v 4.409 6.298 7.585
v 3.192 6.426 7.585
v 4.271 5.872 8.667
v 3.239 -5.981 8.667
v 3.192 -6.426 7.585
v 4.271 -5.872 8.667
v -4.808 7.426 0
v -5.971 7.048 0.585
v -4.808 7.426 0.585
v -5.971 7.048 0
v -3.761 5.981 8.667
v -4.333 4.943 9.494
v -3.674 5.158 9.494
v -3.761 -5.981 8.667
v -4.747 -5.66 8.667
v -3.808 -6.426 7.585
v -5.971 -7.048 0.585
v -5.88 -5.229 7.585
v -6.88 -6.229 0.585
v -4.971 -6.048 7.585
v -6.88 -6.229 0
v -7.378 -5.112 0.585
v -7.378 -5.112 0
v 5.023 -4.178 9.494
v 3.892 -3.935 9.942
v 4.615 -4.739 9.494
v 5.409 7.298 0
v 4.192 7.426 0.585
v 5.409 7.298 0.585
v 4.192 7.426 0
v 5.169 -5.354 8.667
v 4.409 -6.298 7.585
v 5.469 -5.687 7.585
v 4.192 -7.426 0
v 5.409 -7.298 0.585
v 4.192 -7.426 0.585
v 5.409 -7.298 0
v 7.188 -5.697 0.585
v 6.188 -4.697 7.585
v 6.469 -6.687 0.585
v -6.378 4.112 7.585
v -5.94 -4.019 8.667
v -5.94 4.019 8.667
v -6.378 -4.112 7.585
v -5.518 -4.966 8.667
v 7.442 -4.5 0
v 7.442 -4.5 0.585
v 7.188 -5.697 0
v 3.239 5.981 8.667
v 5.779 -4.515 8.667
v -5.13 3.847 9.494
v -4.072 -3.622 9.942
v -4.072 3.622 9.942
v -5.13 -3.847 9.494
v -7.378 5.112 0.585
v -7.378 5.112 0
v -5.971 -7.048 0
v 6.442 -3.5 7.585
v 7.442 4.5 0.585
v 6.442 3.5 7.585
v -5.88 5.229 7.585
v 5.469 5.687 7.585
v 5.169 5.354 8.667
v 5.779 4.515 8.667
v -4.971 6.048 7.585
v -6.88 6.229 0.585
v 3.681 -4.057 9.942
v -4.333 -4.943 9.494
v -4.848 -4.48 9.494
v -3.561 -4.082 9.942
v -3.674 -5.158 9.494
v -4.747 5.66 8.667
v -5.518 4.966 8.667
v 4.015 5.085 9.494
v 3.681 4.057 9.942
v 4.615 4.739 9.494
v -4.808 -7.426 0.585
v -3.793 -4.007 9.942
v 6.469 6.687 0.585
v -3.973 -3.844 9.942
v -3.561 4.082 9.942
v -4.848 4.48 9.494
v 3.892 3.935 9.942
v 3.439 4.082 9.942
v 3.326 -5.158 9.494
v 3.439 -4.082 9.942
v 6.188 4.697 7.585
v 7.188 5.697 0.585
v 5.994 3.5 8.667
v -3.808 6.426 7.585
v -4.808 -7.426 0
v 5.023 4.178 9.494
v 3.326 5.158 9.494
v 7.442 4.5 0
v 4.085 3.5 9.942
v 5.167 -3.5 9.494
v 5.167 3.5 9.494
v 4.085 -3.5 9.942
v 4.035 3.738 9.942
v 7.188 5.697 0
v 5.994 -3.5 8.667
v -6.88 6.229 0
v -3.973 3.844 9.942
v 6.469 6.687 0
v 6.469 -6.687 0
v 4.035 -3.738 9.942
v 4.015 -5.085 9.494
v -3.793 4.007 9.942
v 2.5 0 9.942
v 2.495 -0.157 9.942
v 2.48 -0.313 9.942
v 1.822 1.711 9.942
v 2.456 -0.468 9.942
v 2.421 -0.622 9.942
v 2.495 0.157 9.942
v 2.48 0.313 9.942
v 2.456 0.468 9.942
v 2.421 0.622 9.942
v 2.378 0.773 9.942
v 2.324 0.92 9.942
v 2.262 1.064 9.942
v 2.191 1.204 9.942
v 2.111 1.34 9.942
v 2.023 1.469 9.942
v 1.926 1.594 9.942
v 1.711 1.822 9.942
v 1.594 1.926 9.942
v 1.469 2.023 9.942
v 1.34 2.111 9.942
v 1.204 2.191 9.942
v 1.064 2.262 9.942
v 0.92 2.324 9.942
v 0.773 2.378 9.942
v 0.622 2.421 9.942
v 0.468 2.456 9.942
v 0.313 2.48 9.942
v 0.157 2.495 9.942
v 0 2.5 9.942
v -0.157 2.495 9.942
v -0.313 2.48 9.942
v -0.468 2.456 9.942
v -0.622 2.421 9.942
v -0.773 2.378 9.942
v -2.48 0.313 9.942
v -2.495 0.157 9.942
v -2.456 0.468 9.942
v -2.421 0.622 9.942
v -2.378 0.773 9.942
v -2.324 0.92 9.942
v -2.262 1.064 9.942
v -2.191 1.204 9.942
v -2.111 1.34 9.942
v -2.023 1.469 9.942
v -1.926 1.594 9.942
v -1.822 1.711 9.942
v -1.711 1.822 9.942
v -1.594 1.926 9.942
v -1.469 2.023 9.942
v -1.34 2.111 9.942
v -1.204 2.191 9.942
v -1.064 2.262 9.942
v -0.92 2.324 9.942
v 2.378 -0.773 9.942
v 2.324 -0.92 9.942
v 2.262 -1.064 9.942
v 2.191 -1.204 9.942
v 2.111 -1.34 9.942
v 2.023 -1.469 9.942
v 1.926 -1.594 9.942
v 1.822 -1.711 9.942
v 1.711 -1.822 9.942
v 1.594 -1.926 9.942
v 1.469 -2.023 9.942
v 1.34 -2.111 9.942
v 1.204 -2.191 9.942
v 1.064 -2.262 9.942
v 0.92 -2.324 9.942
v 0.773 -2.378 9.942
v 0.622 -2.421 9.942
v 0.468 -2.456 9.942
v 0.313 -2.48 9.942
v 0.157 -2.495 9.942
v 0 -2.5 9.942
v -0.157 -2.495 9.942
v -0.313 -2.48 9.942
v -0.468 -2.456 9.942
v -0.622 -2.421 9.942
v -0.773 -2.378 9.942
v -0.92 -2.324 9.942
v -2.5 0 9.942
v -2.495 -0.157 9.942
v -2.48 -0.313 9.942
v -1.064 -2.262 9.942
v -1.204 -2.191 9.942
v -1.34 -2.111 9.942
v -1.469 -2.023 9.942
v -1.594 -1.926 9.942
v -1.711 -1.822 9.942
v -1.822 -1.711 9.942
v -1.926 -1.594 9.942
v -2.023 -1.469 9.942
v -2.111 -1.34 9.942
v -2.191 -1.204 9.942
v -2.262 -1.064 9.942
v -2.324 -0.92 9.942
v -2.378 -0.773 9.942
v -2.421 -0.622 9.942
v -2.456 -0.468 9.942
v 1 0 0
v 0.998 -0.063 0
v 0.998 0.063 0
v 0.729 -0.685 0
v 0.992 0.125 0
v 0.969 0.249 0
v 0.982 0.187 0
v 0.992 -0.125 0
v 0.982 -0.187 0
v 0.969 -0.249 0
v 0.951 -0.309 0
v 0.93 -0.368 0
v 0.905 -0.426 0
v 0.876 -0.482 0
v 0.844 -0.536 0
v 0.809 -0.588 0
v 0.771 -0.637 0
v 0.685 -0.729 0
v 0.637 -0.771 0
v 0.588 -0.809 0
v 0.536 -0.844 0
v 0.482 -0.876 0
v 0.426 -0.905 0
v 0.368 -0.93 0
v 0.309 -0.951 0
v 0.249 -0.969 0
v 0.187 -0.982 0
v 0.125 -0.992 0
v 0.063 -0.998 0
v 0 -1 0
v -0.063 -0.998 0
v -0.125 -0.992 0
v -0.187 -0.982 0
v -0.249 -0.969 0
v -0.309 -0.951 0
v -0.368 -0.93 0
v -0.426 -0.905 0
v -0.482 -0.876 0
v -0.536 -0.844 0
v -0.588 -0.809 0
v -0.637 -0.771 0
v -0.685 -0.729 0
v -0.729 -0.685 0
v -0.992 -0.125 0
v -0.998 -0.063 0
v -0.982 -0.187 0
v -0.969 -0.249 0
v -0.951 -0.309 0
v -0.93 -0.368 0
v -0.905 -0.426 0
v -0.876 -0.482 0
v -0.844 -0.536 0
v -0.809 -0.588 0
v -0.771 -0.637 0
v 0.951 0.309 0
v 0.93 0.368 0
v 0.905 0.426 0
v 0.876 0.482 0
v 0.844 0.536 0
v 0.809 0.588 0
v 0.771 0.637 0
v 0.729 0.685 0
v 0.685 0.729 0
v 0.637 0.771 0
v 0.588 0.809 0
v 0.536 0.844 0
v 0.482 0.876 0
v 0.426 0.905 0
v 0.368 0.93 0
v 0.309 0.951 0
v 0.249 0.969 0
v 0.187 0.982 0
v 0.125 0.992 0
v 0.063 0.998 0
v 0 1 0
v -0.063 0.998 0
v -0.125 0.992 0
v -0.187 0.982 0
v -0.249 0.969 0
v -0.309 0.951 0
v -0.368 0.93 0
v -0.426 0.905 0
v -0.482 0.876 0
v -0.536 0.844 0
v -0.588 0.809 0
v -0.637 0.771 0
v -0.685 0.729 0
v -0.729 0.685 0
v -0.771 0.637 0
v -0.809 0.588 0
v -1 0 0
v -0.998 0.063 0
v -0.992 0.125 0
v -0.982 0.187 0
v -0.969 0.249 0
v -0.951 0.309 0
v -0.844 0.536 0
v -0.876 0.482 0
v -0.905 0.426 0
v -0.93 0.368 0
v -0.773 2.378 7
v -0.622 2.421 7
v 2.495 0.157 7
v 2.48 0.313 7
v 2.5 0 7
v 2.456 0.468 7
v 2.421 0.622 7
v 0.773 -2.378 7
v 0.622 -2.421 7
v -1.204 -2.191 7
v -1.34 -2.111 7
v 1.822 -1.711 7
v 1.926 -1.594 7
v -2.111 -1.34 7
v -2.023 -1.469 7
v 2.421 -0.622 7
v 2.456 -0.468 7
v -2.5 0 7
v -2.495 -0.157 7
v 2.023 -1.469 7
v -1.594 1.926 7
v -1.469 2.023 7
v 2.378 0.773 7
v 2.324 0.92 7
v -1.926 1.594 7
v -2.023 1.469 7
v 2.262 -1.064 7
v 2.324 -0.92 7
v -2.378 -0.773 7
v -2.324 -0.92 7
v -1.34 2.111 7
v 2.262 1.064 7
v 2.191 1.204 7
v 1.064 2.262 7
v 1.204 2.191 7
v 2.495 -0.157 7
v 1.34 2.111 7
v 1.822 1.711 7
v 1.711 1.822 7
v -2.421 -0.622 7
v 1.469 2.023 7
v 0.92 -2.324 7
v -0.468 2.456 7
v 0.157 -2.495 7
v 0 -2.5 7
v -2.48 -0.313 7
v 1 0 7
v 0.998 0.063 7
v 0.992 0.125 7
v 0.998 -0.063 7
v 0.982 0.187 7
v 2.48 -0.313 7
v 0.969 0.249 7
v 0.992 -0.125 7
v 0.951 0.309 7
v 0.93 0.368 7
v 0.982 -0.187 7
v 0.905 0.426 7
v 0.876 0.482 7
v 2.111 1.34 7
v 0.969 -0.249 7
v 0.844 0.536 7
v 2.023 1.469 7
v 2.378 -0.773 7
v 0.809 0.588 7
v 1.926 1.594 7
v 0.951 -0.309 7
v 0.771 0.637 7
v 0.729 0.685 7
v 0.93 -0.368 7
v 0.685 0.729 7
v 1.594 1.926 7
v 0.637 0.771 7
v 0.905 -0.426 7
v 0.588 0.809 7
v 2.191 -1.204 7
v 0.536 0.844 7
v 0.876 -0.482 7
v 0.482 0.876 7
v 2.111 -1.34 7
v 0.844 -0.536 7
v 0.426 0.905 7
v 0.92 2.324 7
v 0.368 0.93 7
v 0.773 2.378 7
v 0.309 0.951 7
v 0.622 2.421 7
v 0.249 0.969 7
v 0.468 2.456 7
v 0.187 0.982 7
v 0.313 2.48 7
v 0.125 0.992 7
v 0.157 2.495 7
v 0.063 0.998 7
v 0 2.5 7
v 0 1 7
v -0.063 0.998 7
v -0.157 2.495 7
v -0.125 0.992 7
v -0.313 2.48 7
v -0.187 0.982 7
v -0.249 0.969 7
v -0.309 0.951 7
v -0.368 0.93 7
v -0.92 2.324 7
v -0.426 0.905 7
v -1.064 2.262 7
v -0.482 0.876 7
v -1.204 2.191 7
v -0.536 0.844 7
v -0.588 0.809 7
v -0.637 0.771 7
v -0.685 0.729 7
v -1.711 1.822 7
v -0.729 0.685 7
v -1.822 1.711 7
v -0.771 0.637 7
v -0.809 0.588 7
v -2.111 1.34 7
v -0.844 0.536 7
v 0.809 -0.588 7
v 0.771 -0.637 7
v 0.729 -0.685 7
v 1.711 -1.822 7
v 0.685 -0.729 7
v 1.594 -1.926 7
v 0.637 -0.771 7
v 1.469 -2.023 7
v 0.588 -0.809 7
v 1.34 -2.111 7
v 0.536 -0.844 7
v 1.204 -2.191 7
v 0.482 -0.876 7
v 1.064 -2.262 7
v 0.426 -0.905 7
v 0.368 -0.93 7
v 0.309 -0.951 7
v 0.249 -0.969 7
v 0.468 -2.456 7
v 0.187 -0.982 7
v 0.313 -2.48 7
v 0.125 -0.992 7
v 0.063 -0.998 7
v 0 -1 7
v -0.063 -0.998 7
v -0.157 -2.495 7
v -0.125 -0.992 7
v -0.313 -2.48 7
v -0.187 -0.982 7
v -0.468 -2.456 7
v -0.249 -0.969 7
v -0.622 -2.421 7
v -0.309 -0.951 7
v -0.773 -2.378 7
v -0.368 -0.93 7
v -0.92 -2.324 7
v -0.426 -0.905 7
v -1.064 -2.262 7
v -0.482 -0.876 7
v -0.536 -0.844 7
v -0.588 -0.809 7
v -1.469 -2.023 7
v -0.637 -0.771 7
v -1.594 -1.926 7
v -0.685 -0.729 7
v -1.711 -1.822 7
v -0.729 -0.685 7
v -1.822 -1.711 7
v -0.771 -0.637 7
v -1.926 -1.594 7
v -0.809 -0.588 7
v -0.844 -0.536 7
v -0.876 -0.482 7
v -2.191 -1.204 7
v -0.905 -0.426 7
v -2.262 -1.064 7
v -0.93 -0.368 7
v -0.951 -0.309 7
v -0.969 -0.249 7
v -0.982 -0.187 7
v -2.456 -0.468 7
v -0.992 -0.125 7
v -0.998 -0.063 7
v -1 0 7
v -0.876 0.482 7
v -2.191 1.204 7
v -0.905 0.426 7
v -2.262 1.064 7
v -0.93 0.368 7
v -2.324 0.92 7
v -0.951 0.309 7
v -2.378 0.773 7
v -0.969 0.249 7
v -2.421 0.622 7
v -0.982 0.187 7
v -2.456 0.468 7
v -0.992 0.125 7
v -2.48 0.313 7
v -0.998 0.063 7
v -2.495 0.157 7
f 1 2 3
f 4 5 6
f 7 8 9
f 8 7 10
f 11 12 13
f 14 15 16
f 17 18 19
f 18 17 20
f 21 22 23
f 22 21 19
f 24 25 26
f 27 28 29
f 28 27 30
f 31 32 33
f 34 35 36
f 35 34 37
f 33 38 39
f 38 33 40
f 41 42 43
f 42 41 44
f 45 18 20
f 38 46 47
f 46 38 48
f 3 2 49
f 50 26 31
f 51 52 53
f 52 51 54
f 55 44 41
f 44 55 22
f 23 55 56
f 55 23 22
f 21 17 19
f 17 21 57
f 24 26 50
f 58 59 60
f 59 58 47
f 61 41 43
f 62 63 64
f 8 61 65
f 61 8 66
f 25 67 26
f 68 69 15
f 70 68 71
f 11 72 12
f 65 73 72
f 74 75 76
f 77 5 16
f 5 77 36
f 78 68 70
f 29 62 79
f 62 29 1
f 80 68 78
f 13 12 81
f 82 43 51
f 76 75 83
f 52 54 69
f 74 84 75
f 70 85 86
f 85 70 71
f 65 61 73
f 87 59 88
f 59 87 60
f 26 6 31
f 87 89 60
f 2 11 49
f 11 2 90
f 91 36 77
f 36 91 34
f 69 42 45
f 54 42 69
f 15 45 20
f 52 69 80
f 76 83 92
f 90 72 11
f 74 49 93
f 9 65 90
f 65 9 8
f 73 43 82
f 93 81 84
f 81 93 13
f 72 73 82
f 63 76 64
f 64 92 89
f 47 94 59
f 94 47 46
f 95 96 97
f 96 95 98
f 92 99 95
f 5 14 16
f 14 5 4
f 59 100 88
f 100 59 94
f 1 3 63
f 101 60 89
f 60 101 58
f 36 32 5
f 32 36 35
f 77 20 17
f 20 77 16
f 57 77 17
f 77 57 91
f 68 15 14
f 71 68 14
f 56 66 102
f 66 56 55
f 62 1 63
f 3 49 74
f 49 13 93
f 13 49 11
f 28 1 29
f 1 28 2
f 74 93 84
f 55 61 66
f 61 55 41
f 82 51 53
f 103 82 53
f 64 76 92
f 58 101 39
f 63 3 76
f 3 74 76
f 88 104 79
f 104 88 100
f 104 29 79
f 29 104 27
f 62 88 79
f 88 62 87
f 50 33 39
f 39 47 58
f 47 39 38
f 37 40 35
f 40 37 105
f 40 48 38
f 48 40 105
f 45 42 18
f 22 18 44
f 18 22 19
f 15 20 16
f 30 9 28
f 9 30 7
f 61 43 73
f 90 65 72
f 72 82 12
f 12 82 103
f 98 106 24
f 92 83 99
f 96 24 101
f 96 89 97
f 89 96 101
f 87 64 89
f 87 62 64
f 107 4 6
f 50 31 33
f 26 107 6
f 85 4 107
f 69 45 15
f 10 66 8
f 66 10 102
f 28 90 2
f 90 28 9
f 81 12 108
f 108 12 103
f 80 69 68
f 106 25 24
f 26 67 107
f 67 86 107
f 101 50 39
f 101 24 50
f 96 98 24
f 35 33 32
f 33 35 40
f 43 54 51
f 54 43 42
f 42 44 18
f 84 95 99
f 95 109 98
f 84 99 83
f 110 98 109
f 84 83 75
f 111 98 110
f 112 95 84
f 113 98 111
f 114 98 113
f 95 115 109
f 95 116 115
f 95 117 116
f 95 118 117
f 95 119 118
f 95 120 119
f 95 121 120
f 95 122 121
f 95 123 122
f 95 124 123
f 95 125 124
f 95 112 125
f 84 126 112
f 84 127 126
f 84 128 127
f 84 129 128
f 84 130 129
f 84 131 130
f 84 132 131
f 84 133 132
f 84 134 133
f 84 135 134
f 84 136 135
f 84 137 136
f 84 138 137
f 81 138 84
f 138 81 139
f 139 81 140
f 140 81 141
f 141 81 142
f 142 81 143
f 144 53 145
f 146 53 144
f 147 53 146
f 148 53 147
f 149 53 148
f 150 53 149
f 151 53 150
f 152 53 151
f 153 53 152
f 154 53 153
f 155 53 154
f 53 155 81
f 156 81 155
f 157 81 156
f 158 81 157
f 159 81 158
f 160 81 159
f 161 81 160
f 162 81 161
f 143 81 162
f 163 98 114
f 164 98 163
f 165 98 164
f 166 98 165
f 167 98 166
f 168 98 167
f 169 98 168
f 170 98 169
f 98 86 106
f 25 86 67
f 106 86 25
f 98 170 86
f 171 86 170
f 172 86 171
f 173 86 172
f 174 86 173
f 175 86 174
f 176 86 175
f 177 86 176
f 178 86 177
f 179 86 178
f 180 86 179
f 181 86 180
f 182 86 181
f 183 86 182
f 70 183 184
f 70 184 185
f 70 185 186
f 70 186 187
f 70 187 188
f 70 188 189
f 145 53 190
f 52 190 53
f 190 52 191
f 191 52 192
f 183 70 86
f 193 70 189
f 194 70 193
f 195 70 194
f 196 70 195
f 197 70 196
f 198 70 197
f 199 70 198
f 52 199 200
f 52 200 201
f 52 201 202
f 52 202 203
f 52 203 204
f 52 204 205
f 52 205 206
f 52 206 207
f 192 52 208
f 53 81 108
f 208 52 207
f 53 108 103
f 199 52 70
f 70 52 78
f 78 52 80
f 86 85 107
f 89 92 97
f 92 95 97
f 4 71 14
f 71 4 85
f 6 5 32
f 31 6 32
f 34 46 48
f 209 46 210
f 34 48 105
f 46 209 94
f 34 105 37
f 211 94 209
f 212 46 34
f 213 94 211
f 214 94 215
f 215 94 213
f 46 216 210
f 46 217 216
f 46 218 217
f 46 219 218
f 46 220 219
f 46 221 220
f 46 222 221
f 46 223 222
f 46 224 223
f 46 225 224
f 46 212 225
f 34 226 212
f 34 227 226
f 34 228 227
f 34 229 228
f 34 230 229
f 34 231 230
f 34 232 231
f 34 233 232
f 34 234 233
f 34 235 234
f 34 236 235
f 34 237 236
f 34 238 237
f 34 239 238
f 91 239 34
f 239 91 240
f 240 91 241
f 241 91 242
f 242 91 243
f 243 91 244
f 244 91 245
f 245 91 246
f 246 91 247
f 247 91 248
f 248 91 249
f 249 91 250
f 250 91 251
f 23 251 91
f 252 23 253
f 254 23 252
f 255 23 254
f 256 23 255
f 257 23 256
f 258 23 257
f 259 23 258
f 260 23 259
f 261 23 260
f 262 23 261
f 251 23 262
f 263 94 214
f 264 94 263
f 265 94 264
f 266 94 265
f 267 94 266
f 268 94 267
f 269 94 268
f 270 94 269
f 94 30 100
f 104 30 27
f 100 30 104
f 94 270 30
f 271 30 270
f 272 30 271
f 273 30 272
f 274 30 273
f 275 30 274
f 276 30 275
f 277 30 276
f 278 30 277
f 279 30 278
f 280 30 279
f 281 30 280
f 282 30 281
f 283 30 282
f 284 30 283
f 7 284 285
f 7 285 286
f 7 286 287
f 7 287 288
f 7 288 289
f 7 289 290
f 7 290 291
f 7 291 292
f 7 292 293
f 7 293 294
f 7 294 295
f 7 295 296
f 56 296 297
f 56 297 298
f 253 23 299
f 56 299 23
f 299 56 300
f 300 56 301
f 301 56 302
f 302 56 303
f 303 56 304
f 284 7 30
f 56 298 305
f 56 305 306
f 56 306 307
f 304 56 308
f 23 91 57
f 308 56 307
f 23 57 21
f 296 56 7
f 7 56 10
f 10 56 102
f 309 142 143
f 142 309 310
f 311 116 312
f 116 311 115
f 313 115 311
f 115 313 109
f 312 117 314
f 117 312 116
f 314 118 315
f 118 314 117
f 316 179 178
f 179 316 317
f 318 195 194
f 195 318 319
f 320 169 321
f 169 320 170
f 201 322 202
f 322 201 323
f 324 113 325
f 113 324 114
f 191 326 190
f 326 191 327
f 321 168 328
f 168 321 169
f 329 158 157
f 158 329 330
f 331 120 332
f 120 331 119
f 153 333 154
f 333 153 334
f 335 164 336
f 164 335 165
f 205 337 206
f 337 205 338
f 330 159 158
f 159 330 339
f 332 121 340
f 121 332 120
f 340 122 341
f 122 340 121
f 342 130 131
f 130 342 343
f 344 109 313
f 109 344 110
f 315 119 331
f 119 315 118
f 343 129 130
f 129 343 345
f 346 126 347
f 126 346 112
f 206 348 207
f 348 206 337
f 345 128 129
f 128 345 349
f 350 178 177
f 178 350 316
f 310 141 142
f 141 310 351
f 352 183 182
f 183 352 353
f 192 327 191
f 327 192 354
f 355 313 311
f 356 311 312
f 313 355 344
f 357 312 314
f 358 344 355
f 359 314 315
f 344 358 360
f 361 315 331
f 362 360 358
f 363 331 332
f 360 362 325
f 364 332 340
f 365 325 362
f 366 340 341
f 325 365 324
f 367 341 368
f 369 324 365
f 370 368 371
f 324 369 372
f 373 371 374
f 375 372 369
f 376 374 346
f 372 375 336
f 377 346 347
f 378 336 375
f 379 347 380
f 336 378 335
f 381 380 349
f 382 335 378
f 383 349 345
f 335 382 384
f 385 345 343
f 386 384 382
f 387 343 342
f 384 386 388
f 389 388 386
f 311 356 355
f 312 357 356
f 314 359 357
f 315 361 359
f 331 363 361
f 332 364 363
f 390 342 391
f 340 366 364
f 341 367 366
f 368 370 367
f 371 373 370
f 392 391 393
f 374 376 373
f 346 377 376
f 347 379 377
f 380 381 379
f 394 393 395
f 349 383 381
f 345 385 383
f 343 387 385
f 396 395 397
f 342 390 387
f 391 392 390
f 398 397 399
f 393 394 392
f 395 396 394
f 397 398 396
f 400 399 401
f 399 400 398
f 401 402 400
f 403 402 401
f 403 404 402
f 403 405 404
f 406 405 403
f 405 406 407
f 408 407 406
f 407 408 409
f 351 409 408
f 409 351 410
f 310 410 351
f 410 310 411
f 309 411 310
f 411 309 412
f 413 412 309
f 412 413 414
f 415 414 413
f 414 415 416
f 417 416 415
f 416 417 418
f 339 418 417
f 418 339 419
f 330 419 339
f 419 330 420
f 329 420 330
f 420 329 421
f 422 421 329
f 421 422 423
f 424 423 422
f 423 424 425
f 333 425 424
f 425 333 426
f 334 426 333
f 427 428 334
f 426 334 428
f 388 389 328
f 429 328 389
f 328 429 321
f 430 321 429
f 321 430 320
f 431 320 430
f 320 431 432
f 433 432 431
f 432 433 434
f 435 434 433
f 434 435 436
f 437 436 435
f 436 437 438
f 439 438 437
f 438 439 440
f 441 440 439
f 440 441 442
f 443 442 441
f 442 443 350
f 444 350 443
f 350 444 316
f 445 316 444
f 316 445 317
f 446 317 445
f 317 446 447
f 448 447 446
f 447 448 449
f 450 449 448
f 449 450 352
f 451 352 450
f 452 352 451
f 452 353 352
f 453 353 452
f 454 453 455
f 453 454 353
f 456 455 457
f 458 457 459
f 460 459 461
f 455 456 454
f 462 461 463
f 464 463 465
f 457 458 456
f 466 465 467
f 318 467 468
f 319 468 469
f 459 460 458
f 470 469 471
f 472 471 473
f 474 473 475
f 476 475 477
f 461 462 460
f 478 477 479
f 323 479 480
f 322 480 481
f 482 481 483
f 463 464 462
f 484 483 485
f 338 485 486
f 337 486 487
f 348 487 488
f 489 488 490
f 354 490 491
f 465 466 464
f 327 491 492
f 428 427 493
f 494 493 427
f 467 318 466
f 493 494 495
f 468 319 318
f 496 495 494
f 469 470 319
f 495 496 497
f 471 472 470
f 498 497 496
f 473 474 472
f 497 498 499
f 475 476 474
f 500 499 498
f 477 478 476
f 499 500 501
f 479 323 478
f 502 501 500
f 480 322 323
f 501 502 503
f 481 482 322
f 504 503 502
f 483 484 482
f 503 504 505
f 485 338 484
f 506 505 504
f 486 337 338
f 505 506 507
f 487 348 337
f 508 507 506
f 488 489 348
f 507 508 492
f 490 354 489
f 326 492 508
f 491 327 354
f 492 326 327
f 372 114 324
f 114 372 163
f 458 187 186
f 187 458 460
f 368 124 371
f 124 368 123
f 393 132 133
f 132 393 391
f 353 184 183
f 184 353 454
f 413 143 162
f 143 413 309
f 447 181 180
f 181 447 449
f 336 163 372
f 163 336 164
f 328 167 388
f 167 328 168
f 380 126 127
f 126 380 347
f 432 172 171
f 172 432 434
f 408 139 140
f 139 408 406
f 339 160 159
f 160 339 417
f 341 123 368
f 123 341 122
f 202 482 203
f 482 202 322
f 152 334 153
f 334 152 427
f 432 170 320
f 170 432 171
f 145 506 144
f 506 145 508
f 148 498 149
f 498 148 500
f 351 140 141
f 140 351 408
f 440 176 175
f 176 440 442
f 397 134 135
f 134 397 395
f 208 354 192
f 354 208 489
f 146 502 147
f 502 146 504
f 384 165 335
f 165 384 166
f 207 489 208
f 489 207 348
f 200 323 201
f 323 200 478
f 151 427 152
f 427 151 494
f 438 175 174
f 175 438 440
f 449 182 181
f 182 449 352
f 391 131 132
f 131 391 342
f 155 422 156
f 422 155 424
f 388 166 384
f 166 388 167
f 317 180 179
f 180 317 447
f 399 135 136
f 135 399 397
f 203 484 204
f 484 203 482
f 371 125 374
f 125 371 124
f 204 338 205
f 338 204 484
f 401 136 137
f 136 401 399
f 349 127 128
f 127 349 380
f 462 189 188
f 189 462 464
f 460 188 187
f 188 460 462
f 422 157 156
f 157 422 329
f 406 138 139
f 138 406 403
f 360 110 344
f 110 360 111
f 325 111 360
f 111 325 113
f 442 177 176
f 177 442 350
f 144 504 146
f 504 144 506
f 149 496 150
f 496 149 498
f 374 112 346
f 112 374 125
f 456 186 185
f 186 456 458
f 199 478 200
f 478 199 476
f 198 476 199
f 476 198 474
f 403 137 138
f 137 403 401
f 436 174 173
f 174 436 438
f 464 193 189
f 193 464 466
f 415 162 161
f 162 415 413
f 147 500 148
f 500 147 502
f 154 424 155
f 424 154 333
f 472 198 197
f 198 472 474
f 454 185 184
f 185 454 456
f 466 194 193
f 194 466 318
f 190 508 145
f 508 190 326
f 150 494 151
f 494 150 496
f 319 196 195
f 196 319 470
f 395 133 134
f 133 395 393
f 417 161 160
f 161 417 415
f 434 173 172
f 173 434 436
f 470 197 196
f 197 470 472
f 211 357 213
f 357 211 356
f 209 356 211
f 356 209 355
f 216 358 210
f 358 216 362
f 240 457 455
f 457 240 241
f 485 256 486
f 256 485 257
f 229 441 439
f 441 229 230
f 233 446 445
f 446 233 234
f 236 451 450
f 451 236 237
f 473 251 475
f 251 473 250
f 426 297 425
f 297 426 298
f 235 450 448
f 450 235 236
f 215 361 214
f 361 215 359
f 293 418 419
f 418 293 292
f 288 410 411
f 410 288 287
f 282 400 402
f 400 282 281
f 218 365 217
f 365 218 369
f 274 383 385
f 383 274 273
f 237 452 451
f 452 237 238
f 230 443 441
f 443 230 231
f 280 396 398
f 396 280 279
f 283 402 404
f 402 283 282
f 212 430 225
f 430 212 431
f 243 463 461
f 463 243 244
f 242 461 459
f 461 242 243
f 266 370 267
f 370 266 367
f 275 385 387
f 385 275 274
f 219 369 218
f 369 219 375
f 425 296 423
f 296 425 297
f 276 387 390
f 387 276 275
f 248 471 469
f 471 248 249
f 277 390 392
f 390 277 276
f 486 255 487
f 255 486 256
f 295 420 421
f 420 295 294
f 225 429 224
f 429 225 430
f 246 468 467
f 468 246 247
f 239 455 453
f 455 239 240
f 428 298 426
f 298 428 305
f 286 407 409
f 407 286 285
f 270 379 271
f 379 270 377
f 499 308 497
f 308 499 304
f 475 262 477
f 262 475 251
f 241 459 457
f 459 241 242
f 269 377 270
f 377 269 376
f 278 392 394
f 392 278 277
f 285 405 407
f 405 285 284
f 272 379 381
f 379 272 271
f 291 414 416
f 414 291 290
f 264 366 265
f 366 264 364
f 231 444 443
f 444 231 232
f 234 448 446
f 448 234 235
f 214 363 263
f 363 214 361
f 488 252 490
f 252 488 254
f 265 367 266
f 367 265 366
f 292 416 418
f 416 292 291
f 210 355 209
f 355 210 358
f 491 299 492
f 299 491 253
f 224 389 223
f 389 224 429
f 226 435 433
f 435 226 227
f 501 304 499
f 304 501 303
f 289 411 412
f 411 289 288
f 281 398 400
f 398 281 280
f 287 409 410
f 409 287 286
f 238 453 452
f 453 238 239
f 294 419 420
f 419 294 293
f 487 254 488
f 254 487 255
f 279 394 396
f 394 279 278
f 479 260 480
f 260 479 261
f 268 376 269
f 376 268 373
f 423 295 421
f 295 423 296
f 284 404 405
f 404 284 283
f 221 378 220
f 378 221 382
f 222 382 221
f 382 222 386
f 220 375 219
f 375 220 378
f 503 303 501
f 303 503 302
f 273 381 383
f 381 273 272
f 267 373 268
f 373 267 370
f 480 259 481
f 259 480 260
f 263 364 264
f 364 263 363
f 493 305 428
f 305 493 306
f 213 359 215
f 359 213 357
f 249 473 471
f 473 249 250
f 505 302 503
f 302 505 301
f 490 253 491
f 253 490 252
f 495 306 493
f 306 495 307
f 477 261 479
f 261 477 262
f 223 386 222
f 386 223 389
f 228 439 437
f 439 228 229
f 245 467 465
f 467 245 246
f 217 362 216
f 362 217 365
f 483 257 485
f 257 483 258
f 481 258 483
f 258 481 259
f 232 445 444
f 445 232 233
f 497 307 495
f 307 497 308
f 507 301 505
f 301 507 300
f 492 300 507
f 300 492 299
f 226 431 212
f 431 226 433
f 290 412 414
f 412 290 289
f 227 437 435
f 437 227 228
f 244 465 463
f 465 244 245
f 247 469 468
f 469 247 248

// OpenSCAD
/* 

Parametric Project Foot Generator 

Mike Creuzer - thingiverse@creuzer.com 2013-03-31


*/

// Top is against the project
TopWidth = 15;
// Bottom is agains the floor
BottomWidth = 10;
// How tall the foot is
Height = 10;
// Curved edge radius
Smoothing = 3;
// Smothness of the Smoothing - aka the curve faciting.  15 is faceted but fastish, 100 is really smooth and takes days to render.
SubSmoothing = 15;

// Width of bolt head hole - including room for a ratchet socket if needed
BoltHeadWidth = 5;
// Depth of bolt head hole
BoltHeadDepth = 3;
// Bolt hole width/diameter
BoltWidth = 2;


difference()
{
	SquareFoot();
	bolthole();
}





module bolthole()
{
	translate([0,0,Height - (BoltHeadDepth/2)]) cylinder(h = BoltHeadDepth, r= BoltHeadWidth / 2, $fn=100, center = true);
	translate([0,0,Height/2]) cylinder(h = Height, r= BoltWidth / 2, $fn=100, center = true);
}



module SquareFoot()
{

difference()
{
	minkowski()
	{
		hull()
		{
			cube(size = [TopWidth - (2*Smoothing),TopWidth - (2*Smoothing),0.0001], center = true);
			translate([0,0,Height - Smoothing]) cube(size = [BottomWidth - (Smoothing),BottomWidth - (Smoothing),0.0001], center = true);
		}
		sphere(r=Smoothing, $fn=SubSmoothing);
	}
	translate([0,0, - Smoothing])  cube(size = [TopWidth,TopWidth,Smoothing * 2], center = true);
}


// These are just reference marks so I know that I got the shape and size right.
% hull()
{
 cube(size = [TopWidth,TopWidth,0.0001], center = true);
 translate([0,0,Height]) cube(size = [BottomWidth,BottomWidth,0.0001], center = true);
}

}
